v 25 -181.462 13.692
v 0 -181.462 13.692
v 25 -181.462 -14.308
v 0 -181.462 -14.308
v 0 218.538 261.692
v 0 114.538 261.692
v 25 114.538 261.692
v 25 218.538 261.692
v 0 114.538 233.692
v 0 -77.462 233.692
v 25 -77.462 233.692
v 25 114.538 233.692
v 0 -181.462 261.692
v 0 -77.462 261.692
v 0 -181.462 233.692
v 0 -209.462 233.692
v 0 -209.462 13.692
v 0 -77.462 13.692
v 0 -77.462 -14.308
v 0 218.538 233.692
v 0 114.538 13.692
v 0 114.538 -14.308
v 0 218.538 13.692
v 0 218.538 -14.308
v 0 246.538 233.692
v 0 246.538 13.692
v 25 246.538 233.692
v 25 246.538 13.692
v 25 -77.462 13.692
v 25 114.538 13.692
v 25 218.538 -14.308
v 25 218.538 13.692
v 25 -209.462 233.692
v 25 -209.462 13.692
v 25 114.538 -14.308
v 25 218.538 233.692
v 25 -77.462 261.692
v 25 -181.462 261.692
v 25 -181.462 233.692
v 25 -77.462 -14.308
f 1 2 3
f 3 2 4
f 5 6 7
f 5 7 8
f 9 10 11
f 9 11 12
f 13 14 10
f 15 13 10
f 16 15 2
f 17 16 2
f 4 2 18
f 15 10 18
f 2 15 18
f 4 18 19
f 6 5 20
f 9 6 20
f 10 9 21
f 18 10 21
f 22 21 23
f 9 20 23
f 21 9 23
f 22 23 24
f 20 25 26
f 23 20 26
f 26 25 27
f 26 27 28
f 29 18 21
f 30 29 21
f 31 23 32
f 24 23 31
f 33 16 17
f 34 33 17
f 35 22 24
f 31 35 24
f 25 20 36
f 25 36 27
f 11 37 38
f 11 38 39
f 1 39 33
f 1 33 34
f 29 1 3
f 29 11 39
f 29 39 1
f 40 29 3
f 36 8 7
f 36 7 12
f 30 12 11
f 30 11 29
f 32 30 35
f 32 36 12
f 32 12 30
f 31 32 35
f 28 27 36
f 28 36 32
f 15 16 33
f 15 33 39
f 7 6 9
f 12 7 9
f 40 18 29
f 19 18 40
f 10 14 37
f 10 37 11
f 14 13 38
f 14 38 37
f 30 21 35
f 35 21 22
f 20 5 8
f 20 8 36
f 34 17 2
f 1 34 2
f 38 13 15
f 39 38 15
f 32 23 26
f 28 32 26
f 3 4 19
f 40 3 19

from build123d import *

# Parameters (mm, degrees)
SKETCH1_W           = 276
SKETCH1_H           = 456
BOSS_EXTRUDE1_DEPTH = 25
SKETCH2_W           = 28
SKETCH2_H           = 28
SKETCH2_H_2         = 192
CUT_EXTRUDE1_DEPTH  = 25


with BuildPart() as part:
    # Sketch1 → Boss-Extrude1 (new body)
    with BuildSketch(Plane(origin=(0, 0, 0), x_dir=(0, 0, -1), z_dir=(1, 0, 0))):
        with Locations((-123.692307692, 18.538461538)):
            Rectangle(SKETCH1_W, SKETCH1_H)
    extrude(amount=BOSS_EXTRUDE1_DEPTH)

    # Sketch2 → Cut-Extrude1 (cut)
    with BuildSketch(Plane(origin=(0, 0, 0), x_dir=(0, 0, -1), z_dir=(1, 0, 0))):
        with Locations((0.307692308, -195.461538462)):
            Rectangle(SKETCH2_W, SKETCH2_H)
        with Locations((-247.692307692, -195.461538462)):
            Rectangle(SKETCH2_W, SKETCH2_H)
        with Locations((0.307692308, 232.538461538)):
            Rectangle(SKETCH2_W, SKETCH2_H)
        with Locations((-247.692307692, 232.538461538)):
            Rectangle(SKETCH2_W, SKETCH2_H)
        with Locations((0.307692308, 18.538461538)):
            Rectangle(SKETCH2_W, SKETCH2_H_2)
        with Locations((-247.692307692, 18.538461538)):
            Rectangle(SKETCH2_W, SKETCH2_H_2)
    extrude(amount=CUT_EXTRUDE1_DEPTH, mode=Mode.SUBTRACT)


solid = part.part
